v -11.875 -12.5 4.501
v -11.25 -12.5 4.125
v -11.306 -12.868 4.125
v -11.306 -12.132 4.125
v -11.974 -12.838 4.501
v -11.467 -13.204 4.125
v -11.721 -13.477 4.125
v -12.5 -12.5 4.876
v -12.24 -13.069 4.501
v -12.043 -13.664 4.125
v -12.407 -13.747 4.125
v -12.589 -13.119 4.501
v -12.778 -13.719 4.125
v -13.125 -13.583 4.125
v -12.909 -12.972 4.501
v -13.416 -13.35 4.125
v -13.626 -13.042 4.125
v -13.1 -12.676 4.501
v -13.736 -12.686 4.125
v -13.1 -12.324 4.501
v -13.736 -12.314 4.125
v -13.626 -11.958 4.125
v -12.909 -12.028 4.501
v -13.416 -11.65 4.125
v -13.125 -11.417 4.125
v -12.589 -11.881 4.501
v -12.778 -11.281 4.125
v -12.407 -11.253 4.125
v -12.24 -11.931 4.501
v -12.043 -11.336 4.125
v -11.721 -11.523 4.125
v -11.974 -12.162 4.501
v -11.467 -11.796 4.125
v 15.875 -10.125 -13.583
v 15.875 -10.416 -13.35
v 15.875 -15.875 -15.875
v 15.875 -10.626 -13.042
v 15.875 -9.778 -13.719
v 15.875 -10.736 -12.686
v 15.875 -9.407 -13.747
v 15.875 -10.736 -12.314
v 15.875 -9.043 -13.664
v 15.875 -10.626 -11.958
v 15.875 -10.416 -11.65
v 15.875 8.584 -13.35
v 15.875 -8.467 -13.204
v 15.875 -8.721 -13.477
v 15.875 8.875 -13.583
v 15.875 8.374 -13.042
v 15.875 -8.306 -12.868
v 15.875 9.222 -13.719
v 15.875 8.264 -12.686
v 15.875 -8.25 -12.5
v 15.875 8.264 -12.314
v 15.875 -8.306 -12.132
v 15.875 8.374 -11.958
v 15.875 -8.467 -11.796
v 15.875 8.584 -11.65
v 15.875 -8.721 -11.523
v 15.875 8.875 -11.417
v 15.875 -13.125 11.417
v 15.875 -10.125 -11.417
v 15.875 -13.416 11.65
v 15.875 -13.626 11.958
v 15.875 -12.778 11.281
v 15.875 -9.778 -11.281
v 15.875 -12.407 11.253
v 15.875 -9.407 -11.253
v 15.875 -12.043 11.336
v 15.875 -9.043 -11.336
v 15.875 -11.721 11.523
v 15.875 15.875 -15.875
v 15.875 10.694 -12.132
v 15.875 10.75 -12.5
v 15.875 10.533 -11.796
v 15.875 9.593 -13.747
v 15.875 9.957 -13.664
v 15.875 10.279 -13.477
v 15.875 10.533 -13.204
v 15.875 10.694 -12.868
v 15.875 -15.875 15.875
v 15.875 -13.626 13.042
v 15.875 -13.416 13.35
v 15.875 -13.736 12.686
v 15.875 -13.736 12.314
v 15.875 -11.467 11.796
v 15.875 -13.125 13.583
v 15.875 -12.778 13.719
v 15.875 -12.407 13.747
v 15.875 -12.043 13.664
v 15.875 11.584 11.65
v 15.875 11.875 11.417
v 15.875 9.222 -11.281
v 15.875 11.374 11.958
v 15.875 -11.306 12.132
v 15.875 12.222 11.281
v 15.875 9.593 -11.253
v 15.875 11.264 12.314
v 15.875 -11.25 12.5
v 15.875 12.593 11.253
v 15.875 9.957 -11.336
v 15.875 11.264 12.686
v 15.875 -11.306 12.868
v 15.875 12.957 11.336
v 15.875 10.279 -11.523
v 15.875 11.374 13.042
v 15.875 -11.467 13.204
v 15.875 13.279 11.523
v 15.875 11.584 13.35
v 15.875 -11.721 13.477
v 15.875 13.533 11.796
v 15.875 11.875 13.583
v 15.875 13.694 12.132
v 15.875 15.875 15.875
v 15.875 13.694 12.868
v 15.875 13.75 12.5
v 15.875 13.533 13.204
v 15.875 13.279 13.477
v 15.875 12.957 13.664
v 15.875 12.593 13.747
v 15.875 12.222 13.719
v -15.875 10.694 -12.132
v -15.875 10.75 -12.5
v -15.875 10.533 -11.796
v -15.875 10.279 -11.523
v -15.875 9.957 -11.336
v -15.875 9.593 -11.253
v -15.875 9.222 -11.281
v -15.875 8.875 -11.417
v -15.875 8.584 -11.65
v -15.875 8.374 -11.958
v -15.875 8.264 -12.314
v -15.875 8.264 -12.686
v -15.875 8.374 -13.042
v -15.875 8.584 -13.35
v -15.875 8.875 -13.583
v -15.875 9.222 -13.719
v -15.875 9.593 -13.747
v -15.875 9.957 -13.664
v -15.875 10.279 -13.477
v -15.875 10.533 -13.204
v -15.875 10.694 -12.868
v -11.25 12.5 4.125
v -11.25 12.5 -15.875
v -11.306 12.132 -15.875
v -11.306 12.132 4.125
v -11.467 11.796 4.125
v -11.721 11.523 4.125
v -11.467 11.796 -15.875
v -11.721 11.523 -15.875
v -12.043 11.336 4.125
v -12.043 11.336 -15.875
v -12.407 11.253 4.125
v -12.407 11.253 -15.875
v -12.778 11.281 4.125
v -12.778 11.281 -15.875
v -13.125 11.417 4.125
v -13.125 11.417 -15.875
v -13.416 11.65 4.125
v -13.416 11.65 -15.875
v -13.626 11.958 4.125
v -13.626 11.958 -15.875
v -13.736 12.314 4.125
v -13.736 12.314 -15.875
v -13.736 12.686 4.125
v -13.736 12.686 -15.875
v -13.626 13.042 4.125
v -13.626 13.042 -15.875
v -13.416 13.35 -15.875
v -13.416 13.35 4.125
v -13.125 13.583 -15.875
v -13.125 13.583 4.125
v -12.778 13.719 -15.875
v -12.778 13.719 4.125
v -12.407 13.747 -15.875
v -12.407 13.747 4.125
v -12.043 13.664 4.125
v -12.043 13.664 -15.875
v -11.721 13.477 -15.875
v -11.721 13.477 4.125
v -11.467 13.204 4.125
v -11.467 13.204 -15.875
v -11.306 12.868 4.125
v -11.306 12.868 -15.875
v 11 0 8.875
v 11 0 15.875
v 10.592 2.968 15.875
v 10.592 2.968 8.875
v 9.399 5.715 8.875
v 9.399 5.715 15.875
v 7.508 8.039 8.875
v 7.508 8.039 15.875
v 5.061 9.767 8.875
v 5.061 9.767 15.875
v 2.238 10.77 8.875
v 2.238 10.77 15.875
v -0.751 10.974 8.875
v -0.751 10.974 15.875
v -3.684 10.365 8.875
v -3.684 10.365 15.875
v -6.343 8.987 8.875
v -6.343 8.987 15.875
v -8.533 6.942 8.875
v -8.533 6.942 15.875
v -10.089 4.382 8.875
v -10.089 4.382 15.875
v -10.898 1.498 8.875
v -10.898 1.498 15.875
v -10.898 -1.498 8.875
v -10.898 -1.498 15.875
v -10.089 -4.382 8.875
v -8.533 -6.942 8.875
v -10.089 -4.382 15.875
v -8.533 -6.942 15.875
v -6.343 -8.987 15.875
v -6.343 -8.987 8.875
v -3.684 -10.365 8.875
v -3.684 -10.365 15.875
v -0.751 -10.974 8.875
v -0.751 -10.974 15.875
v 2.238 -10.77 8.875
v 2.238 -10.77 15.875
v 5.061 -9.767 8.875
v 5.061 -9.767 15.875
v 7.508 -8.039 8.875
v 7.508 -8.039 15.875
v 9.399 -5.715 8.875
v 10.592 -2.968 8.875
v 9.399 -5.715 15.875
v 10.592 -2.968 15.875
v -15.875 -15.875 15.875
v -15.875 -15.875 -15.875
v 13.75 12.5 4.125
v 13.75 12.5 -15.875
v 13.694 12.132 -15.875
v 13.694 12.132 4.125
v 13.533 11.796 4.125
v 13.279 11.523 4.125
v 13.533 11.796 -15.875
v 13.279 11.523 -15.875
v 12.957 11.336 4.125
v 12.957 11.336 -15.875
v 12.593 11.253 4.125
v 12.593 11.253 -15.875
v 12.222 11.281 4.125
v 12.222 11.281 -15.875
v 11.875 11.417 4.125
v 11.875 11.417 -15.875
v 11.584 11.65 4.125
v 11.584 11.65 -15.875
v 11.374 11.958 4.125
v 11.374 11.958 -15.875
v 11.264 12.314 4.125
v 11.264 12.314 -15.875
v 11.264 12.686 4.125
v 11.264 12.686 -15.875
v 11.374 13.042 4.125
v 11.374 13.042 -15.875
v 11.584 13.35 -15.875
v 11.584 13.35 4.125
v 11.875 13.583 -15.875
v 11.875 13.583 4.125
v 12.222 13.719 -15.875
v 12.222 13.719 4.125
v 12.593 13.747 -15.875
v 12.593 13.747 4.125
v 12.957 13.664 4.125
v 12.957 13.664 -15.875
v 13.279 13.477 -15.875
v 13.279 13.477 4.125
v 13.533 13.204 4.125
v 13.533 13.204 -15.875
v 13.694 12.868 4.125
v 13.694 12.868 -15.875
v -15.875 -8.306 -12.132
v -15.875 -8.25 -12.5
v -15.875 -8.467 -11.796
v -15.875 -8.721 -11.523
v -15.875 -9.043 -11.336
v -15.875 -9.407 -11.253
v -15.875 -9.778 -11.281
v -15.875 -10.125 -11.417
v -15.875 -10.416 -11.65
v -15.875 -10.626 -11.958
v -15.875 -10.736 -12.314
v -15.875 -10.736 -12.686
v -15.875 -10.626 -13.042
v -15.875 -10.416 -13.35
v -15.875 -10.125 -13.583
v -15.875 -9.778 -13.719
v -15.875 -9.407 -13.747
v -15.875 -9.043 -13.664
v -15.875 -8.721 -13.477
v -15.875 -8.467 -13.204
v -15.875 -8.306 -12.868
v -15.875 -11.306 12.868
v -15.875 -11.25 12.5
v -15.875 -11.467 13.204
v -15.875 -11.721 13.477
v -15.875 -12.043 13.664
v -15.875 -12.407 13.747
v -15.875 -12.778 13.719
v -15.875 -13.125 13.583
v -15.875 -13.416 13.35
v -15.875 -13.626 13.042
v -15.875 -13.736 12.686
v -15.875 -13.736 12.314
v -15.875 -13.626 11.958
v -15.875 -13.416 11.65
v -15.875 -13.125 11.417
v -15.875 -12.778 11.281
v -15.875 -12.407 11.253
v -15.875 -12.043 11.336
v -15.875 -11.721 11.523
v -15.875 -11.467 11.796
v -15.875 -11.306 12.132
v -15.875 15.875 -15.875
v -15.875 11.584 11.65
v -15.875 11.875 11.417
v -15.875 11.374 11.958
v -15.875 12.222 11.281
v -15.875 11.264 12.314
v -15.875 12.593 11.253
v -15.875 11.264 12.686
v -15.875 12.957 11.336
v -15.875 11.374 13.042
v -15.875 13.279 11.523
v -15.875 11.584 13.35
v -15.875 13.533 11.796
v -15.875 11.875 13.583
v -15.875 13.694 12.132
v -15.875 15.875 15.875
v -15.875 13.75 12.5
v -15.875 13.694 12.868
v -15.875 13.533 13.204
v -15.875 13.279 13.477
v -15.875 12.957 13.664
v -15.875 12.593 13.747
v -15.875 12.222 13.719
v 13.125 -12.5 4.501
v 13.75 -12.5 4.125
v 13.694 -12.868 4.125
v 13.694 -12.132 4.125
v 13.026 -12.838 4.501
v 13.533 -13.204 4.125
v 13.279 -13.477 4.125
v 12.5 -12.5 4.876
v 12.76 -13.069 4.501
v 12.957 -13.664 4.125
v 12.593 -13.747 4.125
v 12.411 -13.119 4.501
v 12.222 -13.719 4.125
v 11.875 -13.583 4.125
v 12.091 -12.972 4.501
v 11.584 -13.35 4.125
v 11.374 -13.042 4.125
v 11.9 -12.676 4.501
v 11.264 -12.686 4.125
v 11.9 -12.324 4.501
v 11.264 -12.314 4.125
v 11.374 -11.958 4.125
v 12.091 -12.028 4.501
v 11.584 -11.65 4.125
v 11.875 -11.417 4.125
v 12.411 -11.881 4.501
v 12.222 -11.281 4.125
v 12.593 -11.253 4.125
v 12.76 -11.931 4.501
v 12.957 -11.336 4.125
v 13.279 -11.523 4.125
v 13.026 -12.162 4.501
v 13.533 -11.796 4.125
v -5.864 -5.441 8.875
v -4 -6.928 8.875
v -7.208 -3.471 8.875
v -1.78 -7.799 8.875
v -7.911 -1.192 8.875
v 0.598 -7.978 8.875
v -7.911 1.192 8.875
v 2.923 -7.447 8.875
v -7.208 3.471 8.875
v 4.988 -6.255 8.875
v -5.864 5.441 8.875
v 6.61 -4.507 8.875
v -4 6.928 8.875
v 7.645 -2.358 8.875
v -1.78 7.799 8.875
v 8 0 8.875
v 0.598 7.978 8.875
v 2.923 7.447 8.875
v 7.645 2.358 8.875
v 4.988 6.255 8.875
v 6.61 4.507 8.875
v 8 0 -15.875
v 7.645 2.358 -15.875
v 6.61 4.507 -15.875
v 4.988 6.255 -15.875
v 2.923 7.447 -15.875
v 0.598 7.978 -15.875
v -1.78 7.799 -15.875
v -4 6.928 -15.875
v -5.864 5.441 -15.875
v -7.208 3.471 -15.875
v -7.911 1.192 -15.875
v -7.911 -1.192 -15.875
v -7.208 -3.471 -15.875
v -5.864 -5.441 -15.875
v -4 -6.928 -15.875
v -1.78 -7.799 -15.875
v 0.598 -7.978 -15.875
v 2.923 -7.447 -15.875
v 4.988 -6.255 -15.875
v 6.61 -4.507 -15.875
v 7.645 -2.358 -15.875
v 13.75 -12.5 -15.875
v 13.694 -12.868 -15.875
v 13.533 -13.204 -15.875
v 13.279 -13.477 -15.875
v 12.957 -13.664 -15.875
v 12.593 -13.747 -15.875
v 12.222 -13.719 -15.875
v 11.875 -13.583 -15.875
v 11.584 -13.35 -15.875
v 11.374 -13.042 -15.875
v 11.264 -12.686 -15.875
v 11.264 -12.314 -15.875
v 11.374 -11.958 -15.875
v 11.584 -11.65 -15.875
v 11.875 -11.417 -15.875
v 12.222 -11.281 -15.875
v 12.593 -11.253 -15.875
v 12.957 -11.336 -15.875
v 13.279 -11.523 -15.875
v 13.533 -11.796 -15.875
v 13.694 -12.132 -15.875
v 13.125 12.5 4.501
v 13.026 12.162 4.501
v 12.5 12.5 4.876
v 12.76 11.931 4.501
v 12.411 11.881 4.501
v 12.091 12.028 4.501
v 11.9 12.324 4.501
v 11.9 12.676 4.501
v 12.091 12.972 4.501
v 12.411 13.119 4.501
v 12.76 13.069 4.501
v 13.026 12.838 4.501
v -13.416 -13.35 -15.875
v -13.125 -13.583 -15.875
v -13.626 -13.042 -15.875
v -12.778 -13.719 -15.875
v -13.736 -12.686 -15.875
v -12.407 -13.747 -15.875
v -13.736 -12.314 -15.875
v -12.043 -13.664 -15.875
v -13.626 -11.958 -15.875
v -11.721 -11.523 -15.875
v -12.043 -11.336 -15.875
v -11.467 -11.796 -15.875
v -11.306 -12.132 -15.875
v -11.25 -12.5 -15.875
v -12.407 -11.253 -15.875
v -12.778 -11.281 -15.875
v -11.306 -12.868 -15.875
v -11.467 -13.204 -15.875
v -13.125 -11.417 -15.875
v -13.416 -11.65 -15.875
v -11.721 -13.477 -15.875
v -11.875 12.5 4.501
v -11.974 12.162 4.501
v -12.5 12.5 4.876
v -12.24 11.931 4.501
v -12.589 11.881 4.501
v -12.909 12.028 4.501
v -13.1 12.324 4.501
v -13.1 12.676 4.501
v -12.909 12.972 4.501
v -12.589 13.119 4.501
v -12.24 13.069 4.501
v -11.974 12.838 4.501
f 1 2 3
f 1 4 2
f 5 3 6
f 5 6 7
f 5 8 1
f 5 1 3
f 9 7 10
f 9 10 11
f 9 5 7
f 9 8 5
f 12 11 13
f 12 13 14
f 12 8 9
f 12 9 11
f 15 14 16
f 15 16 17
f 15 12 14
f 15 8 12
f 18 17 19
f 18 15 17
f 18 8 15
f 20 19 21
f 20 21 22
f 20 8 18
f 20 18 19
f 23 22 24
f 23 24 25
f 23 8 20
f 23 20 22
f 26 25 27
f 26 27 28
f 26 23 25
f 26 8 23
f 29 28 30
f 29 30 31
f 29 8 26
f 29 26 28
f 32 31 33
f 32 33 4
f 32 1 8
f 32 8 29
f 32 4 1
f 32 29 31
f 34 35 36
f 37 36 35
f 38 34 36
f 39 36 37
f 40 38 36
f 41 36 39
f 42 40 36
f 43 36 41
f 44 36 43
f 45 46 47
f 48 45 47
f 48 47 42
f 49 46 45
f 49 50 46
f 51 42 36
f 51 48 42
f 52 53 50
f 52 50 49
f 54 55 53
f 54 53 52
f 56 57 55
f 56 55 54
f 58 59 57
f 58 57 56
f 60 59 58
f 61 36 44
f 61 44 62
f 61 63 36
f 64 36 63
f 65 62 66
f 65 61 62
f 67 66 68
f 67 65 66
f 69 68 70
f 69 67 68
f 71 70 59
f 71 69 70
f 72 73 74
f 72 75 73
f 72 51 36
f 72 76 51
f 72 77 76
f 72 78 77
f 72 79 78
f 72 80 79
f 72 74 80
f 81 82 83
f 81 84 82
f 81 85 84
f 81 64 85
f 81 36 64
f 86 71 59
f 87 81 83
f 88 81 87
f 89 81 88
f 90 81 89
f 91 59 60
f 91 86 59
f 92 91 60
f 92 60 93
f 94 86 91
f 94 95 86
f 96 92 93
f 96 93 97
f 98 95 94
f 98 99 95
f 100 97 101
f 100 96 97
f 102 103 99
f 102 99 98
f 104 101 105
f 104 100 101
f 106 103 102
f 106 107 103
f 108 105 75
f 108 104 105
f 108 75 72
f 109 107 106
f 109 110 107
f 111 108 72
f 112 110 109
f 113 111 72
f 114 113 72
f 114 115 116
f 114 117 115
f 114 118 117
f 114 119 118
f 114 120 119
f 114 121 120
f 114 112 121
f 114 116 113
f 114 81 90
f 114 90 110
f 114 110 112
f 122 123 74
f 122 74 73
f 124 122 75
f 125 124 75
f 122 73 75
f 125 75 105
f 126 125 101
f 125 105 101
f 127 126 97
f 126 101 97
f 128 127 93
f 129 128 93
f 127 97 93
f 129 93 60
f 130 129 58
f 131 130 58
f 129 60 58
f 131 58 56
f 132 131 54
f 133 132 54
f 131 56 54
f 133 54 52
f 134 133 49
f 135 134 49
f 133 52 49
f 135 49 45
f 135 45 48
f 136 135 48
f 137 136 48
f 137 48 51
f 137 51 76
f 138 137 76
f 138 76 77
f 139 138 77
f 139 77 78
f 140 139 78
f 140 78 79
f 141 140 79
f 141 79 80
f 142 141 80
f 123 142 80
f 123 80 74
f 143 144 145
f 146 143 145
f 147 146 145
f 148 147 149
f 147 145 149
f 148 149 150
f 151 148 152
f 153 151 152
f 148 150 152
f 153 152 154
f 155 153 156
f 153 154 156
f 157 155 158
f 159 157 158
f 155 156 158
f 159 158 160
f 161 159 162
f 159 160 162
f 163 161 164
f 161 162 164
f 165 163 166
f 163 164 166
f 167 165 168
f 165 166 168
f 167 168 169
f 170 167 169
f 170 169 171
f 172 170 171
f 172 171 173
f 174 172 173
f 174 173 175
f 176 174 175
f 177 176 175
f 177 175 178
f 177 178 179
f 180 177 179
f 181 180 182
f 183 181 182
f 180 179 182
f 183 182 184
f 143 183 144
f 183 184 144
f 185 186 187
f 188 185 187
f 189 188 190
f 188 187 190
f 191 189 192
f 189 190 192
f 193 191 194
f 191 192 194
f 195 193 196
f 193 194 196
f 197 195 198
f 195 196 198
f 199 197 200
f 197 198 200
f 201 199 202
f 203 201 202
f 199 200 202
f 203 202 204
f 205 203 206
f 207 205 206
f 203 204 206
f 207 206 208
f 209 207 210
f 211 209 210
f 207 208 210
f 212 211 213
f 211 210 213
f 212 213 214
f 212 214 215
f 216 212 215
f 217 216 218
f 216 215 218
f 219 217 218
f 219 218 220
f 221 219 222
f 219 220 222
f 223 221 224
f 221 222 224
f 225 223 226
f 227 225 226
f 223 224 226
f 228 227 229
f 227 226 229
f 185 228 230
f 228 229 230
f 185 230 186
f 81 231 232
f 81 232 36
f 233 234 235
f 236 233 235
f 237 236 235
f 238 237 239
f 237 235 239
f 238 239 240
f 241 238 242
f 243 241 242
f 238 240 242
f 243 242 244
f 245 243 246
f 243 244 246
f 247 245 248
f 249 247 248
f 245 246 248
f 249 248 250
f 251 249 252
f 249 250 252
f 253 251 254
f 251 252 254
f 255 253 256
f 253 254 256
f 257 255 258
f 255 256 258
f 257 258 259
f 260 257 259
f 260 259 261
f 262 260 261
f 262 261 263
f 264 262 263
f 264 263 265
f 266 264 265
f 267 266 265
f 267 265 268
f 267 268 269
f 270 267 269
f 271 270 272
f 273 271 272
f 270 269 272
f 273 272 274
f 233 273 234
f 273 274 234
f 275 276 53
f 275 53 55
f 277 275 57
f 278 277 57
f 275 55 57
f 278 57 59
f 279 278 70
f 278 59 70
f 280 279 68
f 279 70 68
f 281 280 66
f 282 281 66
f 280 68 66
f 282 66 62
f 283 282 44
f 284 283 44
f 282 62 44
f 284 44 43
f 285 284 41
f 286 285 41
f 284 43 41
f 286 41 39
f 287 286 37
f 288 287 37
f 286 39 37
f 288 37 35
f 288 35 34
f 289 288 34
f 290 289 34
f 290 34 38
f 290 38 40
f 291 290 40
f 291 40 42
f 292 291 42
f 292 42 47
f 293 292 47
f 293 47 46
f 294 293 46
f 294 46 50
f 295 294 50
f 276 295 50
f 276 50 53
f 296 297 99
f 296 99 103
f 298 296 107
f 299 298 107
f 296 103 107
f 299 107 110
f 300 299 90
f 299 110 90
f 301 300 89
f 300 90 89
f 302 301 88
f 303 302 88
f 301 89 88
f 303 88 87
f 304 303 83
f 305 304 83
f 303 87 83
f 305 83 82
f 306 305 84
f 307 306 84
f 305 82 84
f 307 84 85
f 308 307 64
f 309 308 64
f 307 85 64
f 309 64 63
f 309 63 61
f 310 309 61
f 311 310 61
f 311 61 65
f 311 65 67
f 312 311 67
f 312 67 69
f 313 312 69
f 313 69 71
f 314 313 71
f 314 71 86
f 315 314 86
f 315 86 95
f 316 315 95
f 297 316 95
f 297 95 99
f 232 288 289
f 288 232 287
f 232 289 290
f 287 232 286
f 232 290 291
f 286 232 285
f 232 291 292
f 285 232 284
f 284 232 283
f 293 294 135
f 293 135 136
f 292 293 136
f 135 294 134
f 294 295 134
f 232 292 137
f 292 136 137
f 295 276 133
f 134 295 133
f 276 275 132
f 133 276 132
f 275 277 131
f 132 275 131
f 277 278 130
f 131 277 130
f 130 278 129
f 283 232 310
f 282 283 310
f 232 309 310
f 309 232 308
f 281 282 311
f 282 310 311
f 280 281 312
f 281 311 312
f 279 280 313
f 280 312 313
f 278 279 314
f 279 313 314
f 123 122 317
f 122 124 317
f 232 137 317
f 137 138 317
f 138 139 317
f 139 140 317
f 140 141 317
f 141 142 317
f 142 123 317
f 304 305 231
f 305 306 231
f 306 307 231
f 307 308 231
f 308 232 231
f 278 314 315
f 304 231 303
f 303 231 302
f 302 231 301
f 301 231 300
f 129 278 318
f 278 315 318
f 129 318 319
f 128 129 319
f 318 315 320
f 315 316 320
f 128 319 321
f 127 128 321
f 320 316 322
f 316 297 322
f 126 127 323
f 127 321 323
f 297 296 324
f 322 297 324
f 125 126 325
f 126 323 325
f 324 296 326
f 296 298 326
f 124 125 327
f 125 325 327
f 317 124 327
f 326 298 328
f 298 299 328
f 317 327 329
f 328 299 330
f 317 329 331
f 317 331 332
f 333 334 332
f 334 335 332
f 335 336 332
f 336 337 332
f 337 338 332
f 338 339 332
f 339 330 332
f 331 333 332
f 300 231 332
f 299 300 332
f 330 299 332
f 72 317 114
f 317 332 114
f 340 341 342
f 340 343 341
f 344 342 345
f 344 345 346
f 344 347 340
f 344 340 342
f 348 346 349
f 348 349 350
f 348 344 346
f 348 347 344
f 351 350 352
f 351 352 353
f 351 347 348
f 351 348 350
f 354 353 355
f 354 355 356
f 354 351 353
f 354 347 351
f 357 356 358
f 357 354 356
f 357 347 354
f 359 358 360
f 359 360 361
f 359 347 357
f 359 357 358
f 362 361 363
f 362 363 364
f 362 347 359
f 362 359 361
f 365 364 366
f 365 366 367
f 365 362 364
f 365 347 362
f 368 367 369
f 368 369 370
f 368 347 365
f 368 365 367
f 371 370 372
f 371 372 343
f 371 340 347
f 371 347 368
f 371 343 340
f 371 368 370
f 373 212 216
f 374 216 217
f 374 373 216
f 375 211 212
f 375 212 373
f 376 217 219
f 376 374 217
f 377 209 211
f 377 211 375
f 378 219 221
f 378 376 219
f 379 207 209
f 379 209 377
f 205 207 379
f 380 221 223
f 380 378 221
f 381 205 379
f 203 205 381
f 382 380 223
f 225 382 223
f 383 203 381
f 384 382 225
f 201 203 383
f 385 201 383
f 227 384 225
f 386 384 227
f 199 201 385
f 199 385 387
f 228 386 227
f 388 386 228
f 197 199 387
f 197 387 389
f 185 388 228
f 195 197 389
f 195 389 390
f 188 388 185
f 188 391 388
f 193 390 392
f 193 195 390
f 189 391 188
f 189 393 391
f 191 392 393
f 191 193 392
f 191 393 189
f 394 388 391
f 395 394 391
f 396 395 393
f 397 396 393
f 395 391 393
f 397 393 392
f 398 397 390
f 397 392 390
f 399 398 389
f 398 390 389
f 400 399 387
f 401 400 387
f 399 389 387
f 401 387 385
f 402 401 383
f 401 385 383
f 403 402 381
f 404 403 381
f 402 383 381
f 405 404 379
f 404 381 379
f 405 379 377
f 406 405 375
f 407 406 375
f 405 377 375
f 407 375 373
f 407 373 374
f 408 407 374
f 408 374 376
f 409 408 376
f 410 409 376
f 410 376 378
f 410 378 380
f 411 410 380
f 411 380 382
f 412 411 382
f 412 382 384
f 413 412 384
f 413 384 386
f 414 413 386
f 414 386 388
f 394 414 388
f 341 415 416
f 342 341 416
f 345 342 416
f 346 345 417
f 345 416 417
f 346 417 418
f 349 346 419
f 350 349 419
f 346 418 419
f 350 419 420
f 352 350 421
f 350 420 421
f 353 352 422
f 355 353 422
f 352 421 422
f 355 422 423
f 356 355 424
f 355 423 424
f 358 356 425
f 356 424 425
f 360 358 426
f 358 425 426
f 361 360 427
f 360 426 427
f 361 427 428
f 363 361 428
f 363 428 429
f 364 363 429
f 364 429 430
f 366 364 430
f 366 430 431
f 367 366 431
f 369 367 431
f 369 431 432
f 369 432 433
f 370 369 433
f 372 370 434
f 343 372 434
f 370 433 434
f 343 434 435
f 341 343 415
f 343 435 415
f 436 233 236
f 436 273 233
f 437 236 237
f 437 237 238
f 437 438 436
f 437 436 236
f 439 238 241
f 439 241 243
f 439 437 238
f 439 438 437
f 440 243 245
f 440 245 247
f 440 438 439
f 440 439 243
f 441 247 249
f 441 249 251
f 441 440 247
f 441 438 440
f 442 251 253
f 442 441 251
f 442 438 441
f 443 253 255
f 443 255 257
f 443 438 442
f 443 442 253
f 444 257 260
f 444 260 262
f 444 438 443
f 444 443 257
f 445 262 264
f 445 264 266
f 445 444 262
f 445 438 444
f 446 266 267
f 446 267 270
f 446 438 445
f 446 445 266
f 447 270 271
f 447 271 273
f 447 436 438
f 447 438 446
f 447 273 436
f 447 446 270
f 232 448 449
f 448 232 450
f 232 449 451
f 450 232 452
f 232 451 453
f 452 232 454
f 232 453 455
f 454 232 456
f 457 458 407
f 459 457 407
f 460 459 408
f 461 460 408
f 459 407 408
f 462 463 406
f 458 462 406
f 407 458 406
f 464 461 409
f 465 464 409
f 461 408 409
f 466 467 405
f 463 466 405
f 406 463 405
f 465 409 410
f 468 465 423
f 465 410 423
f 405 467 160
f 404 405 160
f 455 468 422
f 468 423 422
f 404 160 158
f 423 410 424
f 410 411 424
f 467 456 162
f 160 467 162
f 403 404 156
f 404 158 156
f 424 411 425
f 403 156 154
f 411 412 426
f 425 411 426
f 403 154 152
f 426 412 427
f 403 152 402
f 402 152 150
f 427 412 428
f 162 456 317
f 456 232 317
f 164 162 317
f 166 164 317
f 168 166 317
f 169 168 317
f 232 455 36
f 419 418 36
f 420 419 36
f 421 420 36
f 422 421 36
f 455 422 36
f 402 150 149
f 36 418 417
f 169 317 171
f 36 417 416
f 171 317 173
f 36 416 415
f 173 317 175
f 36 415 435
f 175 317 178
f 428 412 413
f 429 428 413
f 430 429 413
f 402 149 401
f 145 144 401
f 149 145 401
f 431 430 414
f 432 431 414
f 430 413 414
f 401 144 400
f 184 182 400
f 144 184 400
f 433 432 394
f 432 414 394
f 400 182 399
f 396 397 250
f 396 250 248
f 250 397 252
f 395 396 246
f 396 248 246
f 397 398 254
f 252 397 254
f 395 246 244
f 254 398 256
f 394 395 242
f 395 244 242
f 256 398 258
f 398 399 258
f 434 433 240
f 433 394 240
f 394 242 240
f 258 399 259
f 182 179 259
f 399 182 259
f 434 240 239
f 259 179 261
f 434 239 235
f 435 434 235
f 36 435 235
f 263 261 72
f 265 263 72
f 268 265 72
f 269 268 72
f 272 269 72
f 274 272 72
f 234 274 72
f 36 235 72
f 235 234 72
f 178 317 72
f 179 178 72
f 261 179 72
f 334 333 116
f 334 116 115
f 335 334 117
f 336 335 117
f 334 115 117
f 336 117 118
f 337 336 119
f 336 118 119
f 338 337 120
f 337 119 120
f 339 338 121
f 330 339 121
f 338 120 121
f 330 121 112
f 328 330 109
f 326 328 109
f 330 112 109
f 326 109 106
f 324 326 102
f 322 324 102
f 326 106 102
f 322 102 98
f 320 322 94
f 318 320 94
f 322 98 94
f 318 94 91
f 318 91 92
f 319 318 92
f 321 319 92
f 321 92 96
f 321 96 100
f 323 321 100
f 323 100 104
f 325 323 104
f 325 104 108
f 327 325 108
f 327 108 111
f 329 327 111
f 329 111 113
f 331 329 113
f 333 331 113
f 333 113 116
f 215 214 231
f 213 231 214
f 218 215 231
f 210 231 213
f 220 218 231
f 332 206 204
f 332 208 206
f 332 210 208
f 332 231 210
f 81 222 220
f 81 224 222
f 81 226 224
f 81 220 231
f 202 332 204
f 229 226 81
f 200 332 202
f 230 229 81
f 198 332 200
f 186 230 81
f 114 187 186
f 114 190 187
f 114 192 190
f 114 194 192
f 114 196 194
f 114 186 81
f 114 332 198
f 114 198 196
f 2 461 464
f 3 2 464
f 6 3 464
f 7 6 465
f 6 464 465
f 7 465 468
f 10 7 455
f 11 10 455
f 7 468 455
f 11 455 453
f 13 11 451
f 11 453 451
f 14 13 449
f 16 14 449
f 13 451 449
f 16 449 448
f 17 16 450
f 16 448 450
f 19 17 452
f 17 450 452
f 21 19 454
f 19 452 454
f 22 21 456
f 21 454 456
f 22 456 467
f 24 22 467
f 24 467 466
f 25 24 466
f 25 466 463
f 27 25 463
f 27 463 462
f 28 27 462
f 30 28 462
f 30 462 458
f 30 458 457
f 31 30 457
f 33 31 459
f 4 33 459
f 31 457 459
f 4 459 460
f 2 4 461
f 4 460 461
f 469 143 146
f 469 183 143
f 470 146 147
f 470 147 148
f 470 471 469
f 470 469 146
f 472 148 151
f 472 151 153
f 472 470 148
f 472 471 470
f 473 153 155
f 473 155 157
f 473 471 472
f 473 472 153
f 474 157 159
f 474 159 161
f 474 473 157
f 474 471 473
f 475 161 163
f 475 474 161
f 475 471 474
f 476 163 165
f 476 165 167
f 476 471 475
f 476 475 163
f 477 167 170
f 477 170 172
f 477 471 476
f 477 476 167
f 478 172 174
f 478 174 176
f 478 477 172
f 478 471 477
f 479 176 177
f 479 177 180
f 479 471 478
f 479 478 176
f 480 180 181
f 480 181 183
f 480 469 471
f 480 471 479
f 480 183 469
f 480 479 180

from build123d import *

# Parameters (mm, degrees)
SKETCH_W        = 31.75
SKETCH_H        = 31.75
PAD_DEPTH       = 15.875
SKETCH001_R     = 11
POCKET_DEPTH    = 7
SKETCH002_R     = 8
POCKET001_DEPTH = 34.926
SKETCH003_R     = 1.25
HOLE_DEPTH      = 31.751
SKETCH004_R     = 1.25
HOLE001_DEPTH   = 20
HOLE001_TIPS_R  = 1.25


with BuildPart() as part:
    # Sketch → Pad (new body, symmetric)
    with BuildSketch(Plane.XY):
        Rectangle(SKETCH_W, SKETCH_H)
    extrude(amount=PAD_DEPTH, both=True)

    # Sketch001 (on Face6 of Pad) → Pocket (cut)
    with BuildSketch(Plane.XY.offset(15.875)):
        Circle(SKETCH001_R)
    extrude(amount=-POCKET_DEPTH, mode=Mode.SUBTRACT)

    # Sketch002 → Pocket001 (cut, through all)
    with BuildSketch(Plane.XY.offset(19.05)):
        Circle(SKETCH002_R)
    extrude(amount=-POCKET001_DEPTH, mode=Mode.SUBTRACT)

    # Sketch003 (on Face6 of Pocket001) → Hole (cut, through all)
    with BuildSketch(Plane.YZ.offset(15.875)):
        with Locations((-12.5, 12.5)):
            Circle(SKETCH003_R)
        with Locations((12.5, 12.5)):
            Circle(SKETCH003_R)
        with Locations((9.5, -12.5)):
            Circle(SKETCH003_R)
        with Locations((-9.5, -12.5)):
            Circle(SKETCH003_R)
    extrude(amount=-HOLE_DEPTH, mode=Mode.SUBTRACT)

    # Sketch004 (on Face4 of Pocket001) → Hole001 (cut)
    with BuildSketch(Plane(origin=(0, 0, -15.875), x_dir=(1, 0, 0), z_dir=(0, 0, -1))):
        with Locations((-12.5, 12.5)):
            Circle(SKETCH004_R)
        with Locations((12.5, 12.5)):
            Circle(SKETCH004_R)
        with Locations((12.5, -12.5)):
            Circle(SKETCH004_R)
        with Locations((-12.5, -12.5)):
            Circle(SKETCH004_R)
    extrude(amount=-HOLE001_DEPTH, mode=Mode.SUBTRACT)

    # Hole001 tips → Hole001 tip 1 section 0
    with BuildSketch(Plane(origin=(0, 0, 4.125), x_dir=(1, 0, 0), z_dir=(0, 0, -1)), mode=Mode.PRIVATE) as hole001_tip_1_s0:
        with Locations((-12.5, 12.5)):
            Circle(HOLE001_TIPS_R)
    loft([hole001_tip_1_s0.sketch, Vertex(-12.5, -12.5, 4.876076)], mode=Mode.SUBTRACT)

    # Hole001 tips → Hole001 tip 2 section 0
    with BuildSketch(Plane(origin=(0, 0, 4.125), x_dir=(1, 0, 0), z_dir=(0, 0, -1)), mode=Mode.PRIVATE) as hole001_tip_2_s0:
        with Locations((12.5, 12.5)):
            Circle(HOLE001_TIPS_R)
    loft([hole001_tip_2_s0.sketch, Vertex(12.5, -12.5, 4.876076)], mode=Mode.SUBTRACT)

    # Hole001 tips → Hole001 tip 3 section 0
    with BuildSketch(Plane(origin=(0, 0, 4.125), x_dir=(1, 0, 0), z_dir=(0, 0, -1)), mode=Mode.PRIVATE) as hole001_tip_3_s0:
        with Locations((12.5, -12.5)):
            Circle(HOLE001_TIPS_R)
    loft([hole001_tip_3_s0.sketch, Vertex(12.5, 12.5, 4.876076)], mode=Mode.SUBTRACT)

    # Hole001 tips → Hole001 tip 4 section 0
    with BuildSketch(Plane(origin=(0, 0, 4.125), x_dir=(1, 0, 0), z_dir=(0, 0, -1)), mode=Mode.PRIVATE) as hole001_tip_4_s0:
        with Locations((-12.5, -12.5)):
            Circle(HOLE001_TIPS_R)
    loft([hole001_tip_4_s0.sketch, Vertex(-12.5, 12.5, 4.876076)], mode=Mode.SUBTRACT)


solid = part.part
